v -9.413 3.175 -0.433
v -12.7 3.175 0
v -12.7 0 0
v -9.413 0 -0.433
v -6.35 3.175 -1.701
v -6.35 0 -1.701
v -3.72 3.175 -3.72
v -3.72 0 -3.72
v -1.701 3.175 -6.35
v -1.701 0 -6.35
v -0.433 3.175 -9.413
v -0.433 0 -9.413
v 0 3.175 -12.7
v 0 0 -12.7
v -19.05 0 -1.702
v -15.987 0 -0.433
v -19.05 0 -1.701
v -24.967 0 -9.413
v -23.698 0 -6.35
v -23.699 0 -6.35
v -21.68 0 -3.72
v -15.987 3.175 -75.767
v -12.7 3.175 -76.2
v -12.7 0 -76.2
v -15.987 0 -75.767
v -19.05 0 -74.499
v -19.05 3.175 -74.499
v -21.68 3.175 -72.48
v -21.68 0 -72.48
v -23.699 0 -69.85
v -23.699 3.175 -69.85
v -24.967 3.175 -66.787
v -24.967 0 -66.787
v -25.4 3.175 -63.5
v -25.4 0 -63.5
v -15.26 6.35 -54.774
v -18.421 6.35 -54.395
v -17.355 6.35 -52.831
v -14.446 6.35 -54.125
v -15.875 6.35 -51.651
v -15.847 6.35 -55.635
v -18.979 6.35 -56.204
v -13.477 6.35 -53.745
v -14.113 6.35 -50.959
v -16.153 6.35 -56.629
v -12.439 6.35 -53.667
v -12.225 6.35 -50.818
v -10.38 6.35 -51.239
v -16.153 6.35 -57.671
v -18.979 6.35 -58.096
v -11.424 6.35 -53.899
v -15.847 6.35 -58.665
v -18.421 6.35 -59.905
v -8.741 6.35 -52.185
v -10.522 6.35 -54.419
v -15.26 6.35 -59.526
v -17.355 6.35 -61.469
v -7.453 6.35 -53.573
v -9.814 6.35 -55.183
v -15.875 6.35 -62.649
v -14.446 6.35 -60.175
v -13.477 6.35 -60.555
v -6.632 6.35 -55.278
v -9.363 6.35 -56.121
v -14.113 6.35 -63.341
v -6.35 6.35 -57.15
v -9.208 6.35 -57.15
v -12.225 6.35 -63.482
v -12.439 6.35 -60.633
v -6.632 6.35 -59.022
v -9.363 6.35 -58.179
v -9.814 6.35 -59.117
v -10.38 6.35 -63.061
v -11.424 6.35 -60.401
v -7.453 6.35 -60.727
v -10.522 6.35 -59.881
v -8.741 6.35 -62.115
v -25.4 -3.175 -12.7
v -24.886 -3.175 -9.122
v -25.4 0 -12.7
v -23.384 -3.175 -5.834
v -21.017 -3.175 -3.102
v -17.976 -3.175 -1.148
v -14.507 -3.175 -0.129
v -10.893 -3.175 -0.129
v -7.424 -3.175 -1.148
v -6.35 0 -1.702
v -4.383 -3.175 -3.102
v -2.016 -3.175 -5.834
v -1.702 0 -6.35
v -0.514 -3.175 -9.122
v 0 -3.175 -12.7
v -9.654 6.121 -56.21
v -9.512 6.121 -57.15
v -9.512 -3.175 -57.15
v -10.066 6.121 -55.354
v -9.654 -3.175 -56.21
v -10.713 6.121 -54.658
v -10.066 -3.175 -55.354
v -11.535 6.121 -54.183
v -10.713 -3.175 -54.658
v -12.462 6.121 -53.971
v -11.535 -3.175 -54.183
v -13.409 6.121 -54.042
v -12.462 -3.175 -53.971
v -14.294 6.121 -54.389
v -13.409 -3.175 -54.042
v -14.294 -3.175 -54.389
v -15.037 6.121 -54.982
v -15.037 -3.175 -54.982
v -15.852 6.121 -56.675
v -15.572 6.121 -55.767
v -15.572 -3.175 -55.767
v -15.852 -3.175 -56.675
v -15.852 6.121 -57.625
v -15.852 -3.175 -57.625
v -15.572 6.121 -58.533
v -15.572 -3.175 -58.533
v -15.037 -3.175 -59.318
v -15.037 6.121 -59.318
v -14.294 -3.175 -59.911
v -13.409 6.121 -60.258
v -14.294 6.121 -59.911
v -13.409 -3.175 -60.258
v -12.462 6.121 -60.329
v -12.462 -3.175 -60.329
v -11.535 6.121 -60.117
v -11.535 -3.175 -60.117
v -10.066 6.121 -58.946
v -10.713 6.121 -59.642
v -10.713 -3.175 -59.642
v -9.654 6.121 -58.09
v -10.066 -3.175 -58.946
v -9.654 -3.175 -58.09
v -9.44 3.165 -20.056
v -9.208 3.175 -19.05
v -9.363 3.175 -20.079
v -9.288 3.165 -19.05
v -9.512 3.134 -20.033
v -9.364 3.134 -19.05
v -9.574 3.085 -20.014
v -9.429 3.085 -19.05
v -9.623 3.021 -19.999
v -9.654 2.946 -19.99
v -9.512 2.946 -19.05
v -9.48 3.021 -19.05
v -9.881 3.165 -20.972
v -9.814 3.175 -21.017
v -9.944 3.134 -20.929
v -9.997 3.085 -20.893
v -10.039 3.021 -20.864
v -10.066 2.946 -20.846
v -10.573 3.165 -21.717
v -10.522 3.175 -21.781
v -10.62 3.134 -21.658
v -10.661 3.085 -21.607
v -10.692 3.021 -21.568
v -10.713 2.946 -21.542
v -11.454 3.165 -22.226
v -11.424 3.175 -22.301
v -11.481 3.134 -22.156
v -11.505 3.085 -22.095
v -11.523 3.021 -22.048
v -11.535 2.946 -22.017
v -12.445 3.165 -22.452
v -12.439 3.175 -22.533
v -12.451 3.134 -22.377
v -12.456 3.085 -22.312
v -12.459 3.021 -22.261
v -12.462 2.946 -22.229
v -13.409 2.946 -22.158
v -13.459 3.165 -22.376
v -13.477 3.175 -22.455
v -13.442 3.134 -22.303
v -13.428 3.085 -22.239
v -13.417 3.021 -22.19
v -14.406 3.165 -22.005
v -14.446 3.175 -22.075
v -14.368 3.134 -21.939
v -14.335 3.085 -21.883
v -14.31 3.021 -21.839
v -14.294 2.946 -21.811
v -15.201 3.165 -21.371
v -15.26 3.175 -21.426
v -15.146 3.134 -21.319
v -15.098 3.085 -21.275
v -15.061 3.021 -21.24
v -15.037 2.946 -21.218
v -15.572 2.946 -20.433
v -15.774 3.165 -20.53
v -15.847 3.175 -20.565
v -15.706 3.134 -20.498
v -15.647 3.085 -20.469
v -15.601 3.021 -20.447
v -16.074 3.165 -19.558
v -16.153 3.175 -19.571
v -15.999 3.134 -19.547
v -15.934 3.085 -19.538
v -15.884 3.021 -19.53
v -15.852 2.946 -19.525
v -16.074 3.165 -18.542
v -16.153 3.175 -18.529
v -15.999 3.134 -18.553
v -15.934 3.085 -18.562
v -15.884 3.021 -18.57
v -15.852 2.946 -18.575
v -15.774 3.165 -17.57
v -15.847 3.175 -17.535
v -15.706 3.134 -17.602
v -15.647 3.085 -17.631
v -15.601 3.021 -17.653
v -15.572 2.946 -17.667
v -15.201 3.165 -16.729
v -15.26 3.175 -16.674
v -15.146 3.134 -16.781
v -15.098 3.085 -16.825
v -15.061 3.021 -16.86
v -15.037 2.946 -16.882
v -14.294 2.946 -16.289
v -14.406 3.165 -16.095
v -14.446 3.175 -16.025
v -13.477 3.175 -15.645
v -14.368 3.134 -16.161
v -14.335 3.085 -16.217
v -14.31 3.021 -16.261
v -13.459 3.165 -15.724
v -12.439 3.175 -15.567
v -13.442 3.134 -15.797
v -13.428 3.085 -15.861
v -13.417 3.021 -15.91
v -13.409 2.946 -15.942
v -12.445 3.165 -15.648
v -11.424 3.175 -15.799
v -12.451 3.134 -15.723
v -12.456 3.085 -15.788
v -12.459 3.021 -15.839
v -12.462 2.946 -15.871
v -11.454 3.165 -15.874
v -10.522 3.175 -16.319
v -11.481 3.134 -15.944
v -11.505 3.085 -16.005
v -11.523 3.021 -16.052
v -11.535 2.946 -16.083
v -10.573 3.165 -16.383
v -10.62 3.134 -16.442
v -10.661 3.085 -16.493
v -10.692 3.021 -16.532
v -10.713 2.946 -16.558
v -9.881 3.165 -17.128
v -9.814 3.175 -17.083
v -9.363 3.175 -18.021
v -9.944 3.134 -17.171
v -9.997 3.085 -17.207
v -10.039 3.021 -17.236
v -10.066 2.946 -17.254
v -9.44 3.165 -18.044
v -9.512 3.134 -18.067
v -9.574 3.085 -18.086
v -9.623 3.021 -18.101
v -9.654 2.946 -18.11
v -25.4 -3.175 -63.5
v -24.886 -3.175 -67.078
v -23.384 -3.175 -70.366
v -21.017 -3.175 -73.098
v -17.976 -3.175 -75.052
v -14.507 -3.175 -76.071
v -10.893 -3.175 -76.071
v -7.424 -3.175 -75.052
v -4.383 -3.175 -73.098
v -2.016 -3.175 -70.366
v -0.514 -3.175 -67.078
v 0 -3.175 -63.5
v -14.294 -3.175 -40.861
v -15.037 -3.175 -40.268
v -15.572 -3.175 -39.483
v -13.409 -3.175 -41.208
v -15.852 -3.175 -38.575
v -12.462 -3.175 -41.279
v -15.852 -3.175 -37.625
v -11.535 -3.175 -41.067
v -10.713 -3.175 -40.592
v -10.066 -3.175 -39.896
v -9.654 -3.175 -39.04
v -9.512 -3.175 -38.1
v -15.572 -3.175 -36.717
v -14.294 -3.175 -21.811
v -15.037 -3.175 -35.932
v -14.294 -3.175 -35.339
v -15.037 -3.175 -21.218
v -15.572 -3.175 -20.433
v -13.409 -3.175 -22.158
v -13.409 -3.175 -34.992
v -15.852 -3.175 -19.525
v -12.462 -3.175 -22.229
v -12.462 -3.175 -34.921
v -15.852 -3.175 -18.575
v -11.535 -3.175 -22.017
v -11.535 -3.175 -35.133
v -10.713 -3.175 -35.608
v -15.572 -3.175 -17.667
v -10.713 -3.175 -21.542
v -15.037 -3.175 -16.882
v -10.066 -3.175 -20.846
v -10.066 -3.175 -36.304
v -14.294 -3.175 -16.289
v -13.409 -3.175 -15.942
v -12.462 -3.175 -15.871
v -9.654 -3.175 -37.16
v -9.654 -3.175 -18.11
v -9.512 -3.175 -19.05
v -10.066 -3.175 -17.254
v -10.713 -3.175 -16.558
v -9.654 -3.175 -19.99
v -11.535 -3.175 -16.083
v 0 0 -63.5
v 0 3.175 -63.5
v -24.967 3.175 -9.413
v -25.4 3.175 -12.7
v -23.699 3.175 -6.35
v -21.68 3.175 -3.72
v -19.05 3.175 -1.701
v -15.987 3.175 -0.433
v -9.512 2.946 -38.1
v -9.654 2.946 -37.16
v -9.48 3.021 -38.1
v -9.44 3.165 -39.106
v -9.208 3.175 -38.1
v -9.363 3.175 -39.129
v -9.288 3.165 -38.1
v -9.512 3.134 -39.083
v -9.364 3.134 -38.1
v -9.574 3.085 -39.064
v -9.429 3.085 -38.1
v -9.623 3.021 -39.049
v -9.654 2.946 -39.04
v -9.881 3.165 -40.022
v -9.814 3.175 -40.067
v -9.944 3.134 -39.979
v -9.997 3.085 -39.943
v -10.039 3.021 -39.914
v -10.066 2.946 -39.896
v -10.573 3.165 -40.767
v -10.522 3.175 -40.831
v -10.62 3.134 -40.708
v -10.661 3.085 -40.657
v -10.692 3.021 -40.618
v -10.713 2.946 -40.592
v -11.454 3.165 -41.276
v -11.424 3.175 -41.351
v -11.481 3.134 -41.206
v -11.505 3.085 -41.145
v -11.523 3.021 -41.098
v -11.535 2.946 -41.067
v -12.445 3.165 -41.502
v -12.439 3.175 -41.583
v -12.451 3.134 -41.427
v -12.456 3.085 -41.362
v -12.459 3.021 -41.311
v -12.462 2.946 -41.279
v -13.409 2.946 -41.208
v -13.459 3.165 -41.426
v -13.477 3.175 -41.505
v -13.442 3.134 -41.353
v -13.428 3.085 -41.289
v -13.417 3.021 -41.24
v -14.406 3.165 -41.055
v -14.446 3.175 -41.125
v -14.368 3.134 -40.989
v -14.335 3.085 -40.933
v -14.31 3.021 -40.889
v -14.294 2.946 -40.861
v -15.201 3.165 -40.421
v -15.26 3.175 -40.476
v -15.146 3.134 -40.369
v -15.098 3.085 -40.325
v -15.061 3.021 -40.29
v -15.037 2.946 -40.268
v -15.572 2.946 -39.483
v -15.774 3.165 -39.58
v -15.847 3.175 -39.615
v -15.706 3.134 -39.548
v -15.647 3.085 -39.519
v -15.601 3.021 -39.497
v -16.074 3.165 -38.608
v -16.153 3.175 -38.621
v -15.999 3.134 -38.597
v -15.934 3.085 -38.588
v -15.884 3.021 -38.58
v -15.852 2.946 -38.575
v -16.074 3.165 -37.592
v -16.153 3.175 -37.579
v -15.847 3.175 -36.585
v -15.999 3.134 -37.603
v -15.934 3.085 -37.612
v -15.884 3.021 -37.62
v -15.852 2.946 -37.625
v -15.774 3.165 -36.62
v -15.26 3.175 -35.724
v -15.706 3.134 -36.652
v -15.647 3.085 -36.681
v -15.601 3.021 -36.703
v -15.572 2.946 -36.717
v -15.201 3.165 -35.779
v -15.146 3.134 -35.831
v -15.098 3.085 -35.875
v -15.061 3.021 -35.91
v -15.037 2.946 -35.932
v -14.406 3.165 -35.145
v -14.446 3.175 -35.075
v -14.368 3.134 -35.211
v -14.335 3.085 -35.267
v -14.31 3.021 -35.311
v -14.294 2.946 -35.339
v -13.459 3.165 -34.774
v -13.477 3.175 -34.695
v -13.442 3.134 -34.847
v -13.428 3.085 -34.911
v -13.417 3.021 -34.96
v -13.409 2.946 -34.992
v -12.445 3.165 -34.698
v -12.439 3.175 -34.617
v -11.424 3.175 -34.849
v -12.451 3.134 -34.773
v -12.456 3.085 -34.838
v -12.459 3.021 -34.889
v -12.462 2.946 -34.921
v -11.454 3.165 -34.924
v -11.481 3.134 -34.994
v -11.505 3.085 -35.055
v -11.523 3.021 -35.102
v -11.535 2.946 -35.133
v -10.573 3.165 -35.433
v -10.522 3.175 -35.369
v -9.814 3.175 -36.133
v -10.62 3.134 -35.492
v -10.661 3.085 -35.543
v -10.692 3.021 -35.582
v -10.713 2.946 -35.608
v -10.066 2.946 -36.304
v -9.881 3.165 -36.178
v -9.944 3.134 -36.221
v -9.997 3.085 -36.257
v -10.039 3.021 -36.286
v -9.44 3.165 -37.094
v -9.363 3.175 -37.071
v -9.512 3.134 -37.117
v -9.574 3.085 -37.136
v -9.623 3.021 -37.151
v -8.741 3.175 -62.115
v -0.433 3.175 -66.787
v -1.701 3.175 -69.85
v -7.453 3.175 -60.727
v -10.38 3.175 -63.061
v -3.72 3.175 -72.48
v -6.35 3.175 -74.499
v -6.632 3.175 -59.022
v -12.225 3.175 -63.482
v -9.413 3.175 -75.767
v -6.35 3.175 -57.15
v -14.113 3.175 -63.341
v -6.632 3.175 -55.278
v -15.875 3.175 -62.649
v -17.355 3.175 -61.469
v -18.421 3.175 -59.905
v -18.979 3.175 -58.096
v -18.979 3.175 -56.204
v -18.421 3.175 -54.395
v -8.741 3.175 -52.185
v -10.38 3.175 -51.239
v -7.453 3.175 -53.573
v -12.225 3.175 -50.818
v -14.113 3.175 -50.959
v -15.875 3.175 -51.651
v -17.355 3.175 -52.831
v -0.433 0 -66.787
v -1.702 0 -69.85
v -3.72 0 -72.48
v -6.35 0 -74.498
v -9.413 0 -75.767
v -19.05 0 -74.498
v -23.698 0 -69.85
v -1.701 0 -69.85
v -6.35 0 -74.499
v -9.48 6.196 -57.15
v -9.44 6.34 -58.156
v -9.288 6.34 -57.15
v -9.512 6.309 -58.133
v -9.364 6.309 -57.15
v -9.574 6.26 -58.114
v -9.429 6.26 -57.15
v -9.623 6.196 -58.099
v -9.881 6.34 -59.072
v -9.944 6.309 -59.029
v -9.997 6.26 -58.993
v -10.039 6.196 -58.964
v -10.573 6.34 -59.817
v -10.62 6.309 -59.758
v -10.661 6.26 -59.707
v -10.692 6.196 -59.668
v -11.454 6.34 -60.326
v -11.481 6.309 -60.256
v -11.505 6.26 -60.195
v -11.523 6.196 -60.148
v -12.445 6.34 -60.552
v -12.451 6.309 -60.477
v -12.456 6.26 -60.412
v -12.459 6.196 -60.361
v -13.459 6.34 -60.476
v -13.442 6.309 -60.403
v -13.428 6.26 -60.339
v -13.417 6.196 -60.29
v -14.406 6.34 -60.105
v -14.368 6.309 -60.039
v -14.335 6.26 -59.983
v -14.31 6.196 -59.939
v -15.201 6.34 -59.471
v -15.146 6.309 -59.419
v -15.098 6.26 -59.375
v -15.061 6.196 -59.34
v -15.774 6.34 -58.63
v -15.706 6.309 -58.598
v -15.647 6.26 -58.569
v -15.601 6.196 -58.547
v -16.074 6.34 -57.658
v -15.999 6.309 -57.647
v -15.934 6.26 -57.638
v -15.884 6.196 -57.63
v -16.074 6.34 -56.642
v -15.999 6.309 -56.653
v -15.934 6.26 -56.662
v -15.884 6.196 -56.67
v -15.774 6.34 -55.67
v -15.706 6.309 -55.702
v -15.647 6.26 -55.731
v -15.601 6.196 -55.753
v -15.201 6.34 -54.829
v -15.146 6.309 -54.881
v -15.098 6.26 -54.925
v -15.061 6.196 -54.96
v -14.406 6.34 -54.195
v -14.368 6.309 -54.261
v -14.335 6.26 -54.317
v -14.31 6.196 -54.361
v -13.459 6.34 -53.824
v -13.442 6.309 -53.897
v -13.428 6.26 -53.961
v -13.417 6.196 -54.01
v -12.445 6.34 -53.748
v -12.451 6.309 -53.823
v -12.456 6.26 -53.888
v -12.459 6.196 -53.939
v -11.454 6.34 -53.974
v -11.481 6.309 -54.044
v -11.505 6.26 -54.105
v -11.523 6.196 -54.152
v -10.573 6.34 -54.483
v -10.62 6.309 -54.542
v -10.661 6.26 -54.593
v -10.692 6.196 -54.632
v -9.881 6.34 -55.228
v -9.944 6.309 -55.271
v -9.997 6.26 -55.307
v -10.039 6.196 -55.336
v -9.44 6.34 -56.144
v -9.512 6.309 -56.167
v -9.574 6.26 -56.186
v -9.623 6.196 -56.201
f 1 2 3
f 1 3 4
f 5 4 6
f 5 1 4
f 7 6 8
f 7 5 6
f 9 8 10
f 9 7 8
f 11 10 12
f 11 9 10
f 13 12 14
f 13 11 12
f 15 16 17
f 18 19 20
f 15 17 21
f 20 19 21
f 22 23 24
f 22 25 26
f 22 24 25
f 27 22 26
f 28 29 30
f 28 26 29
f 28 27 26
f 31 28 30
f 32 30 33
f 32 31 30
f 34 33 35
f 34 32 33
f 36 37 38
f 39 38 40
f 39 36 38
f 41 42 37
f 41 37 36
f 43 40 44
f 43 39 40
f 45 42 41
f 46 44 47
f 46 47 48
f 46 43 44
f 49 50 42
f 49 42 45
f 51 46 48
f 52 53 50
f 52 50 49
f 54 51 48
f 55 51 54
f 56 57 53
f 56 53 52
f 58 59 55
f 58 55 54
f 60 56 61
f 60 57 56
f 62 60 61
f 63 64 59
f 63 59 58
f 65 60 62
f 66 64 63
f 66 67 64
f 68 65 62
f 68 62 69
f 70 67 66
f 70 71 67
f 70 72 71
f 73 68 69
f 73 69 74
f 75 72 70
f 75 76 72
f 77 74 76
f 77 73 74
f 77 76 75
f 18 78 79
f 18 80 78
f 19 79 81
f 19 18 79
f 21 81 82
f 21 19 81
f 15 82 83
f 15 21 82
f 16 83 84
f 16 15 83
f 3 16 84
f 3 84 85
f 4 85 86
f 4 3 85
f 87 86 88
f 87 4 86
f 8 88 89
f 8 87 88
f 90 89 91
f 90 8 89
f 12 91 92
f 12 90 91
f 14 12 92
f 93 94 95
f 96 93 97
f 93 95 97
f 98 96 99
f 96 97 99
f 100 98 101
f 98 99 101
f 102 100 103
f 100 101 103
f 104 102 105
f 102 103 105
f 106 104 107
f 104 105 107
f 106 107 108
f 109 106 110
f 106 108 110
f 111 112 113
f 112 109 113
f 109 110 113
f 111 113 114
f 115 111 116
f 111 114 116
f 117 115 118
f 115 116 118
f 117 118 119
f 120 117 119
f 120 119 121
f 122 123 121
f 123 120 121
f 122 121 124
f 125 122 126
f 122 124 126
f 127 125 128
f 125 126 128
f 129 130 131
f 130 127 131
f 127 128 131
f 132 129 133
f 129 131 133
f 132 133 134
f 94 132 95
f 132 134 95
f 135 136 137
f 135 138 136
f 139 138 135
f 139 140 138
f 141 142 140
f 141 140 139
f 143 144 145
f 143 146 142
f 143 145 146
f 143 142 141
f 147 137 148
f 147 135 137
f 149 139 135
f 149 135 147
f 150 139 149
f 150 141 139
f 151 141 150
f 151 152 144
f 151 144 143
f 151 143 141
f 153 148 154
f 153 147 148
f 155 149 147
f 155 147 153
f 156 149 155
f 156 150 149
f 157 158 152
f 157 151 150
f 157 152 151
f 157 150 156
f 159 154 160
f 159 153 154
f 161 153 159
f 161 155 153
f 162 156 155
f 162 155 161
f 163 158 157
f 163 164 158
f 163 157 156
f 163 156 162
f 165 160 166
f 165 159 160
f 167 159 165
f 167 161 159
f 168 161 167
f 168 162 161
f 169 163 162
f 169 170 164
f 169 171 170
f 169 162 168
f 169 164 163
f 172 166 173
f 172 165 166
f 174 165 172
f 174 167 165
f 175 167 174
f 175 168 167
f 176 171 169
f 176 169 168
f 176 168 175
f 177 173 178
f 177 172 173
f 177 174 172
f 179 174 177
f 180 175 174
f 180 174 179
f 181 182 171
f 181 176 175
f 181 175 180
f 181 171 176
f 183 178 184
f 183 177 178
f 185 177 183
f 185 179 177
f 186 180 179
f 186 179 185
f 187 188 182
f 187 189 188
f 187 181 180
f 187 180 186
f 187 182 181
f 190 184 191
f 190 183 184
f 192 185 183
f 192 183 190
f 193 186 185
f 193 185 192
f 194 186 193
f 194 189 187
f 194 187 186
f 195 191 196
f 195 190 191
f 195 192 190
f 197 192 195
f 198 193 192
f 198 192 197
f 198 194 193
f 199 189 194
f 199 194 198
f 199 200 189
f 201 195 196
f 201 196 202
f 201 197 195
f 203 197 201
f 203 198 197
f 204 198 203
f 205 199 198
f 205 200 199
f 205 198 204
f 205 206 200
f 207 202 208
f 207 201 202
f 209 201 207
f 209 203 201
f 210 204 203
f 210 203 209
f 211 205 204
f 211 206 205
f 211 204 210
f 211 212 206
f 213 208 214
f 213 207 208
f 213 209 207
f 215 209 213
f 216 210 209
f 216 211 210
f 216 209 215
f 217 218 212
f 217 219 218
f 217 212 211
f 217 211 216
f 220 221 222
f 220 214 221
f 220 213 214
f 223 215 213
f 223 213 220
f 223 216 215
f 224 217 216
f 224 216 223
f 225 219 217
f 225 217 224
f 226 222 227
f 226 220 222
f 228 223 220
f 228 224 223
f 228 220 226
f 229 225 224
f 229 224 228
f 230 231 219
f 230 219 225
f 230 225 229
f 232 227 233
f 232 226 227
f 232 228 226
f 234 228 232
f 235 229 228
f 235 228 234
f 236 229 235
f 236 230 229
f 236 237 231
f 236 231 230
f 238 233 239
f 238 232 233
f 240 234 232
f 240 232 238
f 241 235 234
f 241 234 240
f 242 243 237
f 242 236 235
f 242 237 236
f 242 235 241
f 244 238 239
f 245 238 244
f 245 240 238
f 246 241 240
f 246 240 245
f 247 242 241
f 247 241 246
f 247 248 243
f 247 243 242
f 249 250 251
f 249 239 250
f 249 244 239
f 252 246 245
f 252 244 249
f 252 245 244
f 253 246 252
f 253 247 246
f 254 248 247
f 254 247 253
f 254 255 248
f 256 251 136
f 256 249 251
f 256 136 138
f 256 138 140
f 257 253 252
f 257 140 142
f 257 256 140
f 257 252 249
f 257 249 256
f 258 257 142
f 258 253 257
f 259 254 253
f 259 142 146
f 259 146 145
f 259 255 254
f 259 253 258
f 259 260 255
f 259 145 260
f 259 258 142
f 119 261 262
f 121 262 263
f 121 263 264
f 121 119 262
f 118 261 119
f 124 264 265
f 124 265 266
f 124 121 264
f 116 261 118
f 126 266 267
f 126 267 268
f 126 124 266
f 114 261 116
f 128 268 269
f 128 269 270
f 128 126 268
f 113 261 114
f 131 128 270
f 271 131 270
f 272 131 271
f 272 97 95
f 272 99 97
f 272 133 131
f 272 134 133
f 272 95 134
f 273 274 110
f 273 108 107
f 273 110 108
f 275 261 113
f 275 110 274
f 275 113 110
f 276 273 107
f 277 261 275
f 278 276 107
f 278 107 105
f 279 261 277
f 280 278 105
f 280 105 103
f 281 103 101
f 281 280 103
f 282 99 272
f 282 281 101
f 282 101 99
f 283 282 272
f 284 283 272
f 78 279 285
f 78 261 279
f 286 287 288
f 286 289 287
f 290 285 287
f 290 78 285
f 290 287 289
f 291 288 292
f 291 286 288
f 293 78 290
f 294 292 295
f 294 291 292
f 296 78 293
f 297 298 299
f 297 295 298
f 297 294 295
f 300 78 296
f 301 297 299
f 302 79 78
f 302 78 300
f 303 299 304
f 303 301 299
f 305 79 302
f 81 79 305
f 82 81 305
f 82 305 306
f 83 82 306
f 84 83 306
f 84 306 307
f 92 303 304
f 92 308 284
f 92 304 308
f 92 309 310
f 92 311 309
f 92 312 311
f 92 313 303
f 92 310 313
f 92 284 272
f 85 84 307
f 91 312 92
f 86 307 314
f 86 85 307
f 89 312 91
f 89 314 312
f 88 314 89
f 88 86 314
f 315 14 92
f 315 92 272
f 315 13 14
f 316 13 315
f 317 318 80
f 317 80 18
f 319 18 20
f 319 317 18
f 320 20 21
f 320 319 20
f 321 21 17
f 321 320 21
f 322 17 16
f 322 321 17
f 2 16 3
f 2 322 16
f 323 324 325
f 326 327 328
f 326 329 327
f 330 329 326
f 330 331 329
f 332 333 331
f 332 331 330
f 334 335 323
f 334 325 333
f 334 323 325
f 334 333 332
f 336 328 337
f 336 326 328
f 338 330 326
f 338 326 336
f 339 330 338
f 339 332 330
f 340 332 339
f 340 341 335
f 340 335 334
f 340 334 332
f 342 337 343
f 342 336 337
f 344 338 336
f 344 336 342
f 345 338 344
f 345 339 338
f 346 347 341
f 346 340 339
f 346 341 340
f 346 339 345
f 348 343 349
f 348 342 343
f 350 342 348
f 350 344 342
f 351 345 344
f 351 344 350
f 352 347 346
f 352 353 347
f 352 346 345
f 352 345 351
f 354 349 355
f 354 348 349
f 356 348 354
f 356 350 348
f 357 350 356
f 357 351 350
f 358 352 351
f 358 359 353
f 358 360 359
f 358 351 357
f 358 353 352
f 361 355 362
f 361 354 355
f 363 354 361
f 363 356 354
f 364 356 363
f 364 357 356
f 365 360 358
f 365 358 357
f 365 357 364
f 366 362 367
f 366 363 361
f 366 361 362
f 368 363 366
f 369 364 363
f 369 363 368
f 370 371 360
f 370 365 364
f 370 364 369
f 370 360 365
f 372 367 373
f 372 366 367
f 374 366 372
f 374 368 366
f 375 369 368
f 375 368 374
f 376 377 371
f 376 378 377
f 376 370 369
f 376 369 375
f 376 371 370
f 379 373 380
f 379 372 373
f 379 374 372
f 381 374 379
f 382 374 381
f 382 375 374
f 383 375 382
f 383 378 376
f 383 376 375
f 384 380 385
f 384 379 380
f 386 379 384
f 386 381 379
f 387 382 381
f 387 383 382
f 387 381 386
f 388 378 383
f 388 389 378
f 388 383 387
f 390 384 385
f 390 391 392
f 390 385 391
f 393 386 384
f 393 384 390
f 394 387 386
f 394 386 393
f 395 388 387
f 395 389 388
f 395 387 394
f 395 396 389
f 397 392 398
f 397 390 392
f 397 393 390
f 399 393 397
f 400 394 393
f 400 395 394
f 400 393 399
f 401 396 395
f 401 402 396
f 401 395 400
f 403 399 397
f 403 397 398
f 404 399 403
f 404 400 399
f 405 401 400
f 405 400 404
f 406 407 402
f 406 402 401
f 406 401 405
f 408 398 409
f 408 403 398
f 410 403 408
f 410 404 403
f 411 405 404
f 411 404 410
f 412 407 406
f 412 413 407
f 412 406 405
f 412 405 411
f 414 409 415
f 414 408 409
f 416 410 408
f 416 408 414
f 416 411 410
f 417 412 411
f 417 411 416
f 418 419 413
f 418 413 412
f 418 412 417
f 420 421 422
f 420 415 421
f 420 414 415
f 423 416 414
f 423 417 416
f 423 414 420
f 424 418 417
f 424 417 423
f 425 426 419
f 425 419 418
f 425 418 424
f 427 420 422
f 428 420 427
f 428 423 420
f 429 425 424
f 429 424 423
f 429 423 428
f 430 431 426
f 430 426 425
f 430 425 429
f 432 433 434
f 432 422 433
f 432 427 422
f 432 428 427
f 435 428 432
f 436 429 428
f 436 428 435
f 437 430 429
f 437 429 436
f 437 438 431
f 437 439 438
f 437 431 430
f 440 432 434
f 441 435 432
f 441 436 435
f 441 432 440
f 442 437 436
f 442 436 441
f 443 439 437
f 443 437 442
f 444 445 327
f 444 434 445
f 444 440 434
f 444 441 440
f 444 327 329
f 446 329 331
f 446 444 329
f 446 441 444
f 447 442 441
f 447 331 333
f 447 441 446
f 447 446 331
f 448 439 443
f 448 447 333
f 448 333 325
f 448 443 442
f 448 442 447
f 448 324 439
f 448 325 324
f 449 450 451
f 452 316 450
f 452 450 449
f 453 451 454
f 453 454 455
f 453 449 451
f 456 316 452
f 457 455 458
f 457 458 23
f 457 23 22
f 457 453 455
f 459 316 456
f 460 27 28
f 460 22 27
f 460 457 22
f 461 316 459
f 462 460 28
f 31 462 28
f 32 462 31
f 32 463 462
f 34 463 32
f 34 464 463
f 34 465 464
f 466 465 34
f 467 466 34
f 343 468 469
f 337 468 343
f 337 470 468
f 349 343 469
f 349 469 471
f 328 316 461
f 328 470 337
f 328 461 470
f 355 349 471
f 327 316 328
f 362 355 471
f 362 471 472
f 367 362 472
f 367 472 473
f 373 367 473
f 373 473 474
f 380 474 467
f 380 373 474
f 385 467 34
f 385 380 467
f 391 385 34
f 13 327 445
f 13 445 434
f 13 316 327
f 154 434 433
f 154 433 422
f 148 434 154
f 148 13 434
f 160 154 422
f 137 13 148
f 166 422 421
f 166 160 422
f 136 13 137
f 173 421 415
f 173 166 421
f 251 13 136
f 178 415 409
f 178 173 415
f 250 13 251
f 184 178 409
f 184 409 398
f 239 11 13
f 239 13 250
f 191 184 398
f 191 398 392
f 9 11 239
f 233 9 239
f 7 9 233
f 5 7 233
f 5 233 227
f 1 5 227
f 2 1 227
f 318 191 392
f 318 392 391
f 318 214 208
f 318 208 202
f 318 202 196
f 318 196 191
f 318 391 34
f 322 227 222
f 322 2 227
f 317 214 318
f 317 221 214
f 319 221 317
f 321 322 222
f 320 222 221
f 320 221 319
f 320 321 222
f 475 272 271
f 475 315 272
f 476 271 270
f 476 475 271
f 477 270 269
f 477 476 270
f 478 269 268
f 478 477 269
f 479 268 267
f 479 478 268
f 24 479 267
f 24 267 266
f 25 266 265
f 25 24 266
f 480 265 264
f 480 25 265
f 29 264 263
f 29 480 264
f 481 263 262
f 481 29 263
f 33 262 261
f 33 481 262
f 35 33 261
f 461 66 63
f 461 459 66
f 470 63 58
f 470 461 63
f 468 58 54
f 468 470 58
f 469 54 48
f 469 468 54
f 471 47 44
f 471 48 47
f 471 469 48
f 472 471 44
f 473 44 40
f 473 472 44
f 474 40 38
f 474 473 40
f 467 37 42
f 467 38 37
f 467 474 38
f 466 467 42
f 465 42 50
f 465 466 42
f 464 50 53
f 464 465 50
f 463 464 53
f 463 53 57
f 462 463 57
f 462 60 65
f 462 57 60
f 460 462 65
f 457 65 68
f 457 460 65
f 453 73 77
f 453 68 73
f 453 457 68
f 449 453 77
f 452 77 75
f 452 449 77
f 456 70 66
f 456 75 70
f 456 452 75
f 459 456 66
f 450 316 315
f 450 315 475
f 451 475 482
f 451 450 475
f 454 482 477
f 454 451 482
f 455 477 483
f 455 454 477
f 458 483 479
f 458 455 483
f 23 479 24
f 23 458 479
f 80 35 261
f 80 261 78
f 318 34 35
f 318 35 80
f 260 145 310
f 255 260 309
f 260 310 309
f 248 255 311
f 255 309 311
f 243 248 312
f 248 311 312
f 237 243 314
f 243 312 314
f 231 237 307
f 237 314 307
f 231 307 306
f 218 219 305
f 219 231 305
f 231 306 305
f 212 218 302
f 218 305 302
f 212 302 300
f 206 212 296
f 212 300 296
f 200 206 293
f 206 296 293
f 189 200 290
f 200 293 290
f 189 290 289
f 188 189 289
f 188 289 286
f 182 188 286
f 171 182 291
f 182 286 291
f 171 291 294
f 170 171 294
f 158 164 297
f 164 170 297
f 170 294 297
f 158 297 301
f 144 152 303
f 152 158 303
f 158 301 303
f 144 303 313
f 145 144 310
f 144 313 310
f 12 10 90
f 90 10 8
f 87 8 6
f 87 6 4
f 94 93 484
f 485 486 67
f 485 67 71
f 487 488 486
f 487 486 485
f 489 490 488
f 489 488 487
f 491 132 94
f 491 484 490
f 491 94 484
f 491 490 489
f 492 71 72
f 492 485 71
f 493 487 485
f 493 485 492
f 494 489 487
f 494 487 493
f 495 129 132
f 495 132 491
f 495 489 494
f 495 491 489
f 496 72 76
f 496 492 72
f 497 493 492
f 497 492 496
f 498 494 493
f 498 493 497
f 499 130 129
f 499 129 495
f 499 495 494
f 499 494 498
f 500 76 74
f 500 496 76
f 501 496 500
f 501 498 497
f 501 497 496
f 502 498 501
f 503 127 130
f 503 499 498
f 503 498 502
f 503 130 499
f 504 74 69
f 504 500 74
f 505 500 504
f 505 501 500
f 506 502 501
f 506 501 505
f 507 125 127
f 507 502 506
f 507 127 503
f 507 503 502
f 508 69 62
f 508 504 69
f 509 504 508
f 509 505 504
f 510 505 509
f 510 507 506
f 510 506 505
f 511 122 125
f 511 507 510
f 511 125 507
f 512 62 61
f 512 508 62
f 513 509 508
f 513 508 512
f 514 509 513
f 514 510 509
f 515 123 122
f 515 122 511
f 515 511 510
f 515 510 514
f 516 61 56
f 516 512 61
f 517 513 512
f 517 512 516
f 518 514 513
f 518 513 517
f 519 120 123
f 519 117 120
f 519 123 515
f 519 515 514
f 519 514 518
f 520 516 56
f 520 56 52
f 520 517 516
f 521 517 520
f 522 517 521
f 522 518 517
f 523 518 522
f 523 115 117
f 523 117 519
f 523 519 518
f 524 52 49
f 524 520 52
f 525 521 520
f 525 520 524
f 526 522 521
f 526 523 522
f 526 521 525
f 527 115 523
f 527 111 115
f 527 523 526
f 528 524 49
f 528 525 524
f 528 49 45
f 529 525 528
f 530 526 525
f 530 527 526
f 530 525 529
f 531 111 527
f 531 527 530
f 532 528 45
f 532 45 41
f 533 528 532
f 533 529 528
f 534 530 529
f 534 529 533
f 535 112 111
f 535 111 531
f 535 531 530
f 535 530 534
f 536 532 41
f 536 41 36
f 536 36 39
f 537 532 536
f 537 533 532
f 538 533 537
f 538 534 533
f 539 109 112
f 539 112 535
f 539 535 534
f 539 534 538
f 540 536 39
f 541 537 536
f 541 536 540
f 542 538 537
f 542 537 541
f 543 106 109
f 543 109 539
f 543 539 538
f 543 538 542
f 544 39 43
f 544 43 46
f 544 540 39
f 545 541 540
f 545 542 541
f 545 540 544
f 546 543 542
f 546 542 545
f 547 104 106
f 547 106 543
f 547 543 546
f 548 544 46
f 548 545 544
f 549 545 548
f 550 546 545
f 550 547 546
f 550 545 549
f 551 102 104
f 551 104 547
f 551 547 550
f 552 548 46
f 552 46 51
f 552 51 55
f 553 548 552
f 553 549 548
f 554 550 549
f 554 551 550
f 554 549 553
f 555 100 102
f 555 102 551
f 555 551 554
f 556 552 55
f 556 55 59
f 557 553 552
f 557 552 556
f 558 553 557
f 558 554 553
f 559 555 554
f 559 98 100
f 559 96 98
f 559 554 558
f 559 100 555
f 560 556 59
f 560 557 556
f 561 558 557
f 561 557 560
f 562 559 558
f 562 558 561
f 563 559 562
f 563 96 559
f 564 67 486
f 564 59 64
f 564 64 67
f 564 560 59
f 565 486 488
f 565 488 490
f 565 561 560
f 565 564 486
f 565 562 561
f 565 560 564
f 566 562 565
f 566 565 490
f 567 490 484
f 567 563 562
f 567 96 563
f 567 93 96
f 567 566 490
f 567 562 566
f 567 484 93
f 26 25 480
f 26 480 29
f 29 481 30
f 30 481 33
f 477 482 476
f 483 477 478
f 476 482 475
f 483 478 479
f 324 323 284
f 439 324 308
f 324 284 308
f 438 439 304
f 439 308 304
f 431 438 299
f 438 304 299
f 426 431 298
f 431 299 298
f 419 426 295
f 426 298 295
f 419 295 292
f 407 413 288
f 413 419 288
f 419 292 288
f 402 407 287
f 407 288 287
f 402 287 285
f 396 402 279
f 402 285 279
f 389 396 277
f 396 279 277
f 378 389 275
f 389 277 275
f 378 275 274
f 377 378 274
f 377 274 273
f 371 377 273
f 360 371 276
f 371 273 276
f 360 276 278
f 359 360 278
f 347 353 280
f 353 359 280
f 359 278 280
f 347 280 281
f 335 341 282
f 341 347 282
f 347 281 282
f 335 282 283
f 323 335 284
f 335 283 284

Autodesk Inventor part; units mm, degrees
ref_plane "YZ Plane" through (0, 0, 0) normal (1, 0, 0) x (0, 1, 0)
ref_plane "XZ Plane" through (0, 0, 0) normal (0, 1, 0) x (-1, 0, 0)
ref_plane "XY Plane" through (0, 0, 0) normal (0, 0, 1) x (1, 0, 0)
sketch "Sketch1" plane through (0, 0, 0) normal (0, 1, 0) x (-1, 0, 0)
  line L0 (0, 0) -> (25.4, 0)
  line L1 (25.4, 0) -> (25.4, -76.2)
  line L2 (25.4, -76.2) -> (0, -76.2)
  line L3 (0, -76.2) -> (0, 0)
  dimension "d0" = 25.4
  dimension "d1" = 76.2
extrude "Extrusion1" add sketch "Sketch1" along normal blind 3.175
sketch "Sketch2" plane through (0, 3.175, 0) normal (0, 1, 0) x (1, 0, 0)
  line L0 (-25.4, 76.2) -> (-25.4, 0) projected
  line L1 (0, 76.2) -> (-25.4, 76.2) projected
  line L2 (-25.4, 0) -> (0, 76.2)
  line L3 (0, 76.2) -> (-25.4, 76.2)
  line L4 (-25.4, 76.2) -> (0, 0)
  line L5 (0, 0) -> (-12.7, 38.1)
  line L6 (-25.4, 0) -> (0, 0) projected
  line L7 (-12.7, 0) -> (-12.7, 76.2)
  circle A0 centre (-12.7, 38.1) radius 3.175
  line L8 (-12.7, 38.1) -> (-12.7, 0)
  circle A1 centre (-12.7, 19.05) radius 3.175
  line L9 (-12.7, 38.1) -> (-12.7, 76.2)
  circle A2 centre (-12.7, 57.15) radius 3.175
  dimension "d4" = 6.35
  dimension "d5" = 6.35
  dimension "d6" = 6.35
extrude "Extrusion2" cut sketch "Sketch2" against normal blind 3.175 contours A0 L7 L4 | L4 L2 A0 | L2 L7 A0 | A2 L7 | L7 A2 | L7 A0 L2 | L2 A0 L4 | L4 A0 L7 | A1 L7 | L7 A1
fillet "Fillet1" radius 12.7 4 edges at (0, 1.5875, 0) (-25.4, 1.5875, 0) (0, 1.5875, -76.2) (-25.4, 1.5875, -76.2)
fillet "Fillet2" radius 0.3175 3 edges at (-15.875, 3.175, -57.15) (-15.875, 3.175, -38.1) (-15.875, 3.175, -19.05)
sketch "Sketch3" plane through (0, 3.175, 0) normal (0, 1, 0) x (1, 0, 0)
  circle A0 centre (-12.7, 57.15) radius 3.175 projected
  circle A1 centre (-12.7, 57.15) radius 6.35
  point P0 (0, 0)
  dimension "d11" = 12.7
extrude "Extrusion3" add sketch "Sketch3" along normal blind 3.175
sketch "Sketch4" plane through (-12.7, 6.35, -57.15) normal (0, 1, 0) x (1, 0, 0)
  circle A0 centre (0, 0) radius 6.35 projected
  circle A1 centre (0, 0) radius 3.175 projected
  point P0 (12.7, -57.15)
extrude "Extrusion4" add sketch "Sketch4" against normal through all
fillet "Fillet3" radius 0.3175 1 edges at (-15.875, 6.35, -57.15)
sketch "Sketch5" plane through (0, 0, 0) normal (0, -1, 0) x (1, 0, 0)
  circle A0 centre (-12.7, -38.1) radius 3.175 projected
  circle A1 centre (-12.7, -19.05) radius 3.175 projected
  arc A2 (-25.4, -63.5) -> (0, -63.5) centre (-12.7, -63.5) ccw projected
  line L0 (0, -12.7) -> (0, -63.5) projected
  arc A3 (0, -12.7) -> (-25.4, -12.7) centre (-12.7, -12.7) ccw projected
  line L1 (-25.4, -63.5) -> (-25.4, -12.7) projected
  circle A4 centre (-12.7, -57.15) radius 3.175 projected
  point P0 (0, 0)
extrude "Extrusion5" add sketch "Sketch5" along normal blind 3.175
sketch "Sketch6" plane through (0, -3.175, 0) normal (0, -1, 0) x (1, 0, 0)
  line L0 (-25.4, -12.7) -> (-25.4, -63.5) projected
  arc A0 (-25.4, -63.5) -> (0, -63.5) centre (-12.7, -63.5) ccw projected
  line L1 (0, -63.5) -> (0, -12.7) projected
  arc A1 (0, -12.7) -> (-25.4, -12.7) centre (-12.7, -12.7) ccw projected
  circle A2 centre (-12.7, -57.15) radius 3.175 projected
  circle A3 centre (-12.7, -19.05) radius 3.175 projected
  circle A4 centre (-12.7, -38.1) radius 3.175 projected
  circle A5 centre (-12.7, -57.15) radius 3.175
  circle A6 centre (-12.7, -57.15) radius 3.1877
  circle A7 centre (-12.7, -38.1) radius 3.175
  circle A8 centre (-12.7, -38.1) radius 3.175 projected
  circle A9 centre (-12.7, -38.1) radius 3.1877
  circle A10 centre (-12.7, -19.05) radius 3.175
  circle A11 centre (-12.7, -19.05) radius 3.175
  circle A12 centre (-12.7, -19.05) radius 3.1877
  point P0 (0, 0)
  dimension "d19" = 6.3754
  dimension "d20" = 6.3754
  dimension "d21" = 6.3754
extrude "Extrusion6" cut sketch "Sketch6" against normal blind 25.4 contours A2 | A3 | A4 | A6 | A9 | A12
properties part number "Board"
